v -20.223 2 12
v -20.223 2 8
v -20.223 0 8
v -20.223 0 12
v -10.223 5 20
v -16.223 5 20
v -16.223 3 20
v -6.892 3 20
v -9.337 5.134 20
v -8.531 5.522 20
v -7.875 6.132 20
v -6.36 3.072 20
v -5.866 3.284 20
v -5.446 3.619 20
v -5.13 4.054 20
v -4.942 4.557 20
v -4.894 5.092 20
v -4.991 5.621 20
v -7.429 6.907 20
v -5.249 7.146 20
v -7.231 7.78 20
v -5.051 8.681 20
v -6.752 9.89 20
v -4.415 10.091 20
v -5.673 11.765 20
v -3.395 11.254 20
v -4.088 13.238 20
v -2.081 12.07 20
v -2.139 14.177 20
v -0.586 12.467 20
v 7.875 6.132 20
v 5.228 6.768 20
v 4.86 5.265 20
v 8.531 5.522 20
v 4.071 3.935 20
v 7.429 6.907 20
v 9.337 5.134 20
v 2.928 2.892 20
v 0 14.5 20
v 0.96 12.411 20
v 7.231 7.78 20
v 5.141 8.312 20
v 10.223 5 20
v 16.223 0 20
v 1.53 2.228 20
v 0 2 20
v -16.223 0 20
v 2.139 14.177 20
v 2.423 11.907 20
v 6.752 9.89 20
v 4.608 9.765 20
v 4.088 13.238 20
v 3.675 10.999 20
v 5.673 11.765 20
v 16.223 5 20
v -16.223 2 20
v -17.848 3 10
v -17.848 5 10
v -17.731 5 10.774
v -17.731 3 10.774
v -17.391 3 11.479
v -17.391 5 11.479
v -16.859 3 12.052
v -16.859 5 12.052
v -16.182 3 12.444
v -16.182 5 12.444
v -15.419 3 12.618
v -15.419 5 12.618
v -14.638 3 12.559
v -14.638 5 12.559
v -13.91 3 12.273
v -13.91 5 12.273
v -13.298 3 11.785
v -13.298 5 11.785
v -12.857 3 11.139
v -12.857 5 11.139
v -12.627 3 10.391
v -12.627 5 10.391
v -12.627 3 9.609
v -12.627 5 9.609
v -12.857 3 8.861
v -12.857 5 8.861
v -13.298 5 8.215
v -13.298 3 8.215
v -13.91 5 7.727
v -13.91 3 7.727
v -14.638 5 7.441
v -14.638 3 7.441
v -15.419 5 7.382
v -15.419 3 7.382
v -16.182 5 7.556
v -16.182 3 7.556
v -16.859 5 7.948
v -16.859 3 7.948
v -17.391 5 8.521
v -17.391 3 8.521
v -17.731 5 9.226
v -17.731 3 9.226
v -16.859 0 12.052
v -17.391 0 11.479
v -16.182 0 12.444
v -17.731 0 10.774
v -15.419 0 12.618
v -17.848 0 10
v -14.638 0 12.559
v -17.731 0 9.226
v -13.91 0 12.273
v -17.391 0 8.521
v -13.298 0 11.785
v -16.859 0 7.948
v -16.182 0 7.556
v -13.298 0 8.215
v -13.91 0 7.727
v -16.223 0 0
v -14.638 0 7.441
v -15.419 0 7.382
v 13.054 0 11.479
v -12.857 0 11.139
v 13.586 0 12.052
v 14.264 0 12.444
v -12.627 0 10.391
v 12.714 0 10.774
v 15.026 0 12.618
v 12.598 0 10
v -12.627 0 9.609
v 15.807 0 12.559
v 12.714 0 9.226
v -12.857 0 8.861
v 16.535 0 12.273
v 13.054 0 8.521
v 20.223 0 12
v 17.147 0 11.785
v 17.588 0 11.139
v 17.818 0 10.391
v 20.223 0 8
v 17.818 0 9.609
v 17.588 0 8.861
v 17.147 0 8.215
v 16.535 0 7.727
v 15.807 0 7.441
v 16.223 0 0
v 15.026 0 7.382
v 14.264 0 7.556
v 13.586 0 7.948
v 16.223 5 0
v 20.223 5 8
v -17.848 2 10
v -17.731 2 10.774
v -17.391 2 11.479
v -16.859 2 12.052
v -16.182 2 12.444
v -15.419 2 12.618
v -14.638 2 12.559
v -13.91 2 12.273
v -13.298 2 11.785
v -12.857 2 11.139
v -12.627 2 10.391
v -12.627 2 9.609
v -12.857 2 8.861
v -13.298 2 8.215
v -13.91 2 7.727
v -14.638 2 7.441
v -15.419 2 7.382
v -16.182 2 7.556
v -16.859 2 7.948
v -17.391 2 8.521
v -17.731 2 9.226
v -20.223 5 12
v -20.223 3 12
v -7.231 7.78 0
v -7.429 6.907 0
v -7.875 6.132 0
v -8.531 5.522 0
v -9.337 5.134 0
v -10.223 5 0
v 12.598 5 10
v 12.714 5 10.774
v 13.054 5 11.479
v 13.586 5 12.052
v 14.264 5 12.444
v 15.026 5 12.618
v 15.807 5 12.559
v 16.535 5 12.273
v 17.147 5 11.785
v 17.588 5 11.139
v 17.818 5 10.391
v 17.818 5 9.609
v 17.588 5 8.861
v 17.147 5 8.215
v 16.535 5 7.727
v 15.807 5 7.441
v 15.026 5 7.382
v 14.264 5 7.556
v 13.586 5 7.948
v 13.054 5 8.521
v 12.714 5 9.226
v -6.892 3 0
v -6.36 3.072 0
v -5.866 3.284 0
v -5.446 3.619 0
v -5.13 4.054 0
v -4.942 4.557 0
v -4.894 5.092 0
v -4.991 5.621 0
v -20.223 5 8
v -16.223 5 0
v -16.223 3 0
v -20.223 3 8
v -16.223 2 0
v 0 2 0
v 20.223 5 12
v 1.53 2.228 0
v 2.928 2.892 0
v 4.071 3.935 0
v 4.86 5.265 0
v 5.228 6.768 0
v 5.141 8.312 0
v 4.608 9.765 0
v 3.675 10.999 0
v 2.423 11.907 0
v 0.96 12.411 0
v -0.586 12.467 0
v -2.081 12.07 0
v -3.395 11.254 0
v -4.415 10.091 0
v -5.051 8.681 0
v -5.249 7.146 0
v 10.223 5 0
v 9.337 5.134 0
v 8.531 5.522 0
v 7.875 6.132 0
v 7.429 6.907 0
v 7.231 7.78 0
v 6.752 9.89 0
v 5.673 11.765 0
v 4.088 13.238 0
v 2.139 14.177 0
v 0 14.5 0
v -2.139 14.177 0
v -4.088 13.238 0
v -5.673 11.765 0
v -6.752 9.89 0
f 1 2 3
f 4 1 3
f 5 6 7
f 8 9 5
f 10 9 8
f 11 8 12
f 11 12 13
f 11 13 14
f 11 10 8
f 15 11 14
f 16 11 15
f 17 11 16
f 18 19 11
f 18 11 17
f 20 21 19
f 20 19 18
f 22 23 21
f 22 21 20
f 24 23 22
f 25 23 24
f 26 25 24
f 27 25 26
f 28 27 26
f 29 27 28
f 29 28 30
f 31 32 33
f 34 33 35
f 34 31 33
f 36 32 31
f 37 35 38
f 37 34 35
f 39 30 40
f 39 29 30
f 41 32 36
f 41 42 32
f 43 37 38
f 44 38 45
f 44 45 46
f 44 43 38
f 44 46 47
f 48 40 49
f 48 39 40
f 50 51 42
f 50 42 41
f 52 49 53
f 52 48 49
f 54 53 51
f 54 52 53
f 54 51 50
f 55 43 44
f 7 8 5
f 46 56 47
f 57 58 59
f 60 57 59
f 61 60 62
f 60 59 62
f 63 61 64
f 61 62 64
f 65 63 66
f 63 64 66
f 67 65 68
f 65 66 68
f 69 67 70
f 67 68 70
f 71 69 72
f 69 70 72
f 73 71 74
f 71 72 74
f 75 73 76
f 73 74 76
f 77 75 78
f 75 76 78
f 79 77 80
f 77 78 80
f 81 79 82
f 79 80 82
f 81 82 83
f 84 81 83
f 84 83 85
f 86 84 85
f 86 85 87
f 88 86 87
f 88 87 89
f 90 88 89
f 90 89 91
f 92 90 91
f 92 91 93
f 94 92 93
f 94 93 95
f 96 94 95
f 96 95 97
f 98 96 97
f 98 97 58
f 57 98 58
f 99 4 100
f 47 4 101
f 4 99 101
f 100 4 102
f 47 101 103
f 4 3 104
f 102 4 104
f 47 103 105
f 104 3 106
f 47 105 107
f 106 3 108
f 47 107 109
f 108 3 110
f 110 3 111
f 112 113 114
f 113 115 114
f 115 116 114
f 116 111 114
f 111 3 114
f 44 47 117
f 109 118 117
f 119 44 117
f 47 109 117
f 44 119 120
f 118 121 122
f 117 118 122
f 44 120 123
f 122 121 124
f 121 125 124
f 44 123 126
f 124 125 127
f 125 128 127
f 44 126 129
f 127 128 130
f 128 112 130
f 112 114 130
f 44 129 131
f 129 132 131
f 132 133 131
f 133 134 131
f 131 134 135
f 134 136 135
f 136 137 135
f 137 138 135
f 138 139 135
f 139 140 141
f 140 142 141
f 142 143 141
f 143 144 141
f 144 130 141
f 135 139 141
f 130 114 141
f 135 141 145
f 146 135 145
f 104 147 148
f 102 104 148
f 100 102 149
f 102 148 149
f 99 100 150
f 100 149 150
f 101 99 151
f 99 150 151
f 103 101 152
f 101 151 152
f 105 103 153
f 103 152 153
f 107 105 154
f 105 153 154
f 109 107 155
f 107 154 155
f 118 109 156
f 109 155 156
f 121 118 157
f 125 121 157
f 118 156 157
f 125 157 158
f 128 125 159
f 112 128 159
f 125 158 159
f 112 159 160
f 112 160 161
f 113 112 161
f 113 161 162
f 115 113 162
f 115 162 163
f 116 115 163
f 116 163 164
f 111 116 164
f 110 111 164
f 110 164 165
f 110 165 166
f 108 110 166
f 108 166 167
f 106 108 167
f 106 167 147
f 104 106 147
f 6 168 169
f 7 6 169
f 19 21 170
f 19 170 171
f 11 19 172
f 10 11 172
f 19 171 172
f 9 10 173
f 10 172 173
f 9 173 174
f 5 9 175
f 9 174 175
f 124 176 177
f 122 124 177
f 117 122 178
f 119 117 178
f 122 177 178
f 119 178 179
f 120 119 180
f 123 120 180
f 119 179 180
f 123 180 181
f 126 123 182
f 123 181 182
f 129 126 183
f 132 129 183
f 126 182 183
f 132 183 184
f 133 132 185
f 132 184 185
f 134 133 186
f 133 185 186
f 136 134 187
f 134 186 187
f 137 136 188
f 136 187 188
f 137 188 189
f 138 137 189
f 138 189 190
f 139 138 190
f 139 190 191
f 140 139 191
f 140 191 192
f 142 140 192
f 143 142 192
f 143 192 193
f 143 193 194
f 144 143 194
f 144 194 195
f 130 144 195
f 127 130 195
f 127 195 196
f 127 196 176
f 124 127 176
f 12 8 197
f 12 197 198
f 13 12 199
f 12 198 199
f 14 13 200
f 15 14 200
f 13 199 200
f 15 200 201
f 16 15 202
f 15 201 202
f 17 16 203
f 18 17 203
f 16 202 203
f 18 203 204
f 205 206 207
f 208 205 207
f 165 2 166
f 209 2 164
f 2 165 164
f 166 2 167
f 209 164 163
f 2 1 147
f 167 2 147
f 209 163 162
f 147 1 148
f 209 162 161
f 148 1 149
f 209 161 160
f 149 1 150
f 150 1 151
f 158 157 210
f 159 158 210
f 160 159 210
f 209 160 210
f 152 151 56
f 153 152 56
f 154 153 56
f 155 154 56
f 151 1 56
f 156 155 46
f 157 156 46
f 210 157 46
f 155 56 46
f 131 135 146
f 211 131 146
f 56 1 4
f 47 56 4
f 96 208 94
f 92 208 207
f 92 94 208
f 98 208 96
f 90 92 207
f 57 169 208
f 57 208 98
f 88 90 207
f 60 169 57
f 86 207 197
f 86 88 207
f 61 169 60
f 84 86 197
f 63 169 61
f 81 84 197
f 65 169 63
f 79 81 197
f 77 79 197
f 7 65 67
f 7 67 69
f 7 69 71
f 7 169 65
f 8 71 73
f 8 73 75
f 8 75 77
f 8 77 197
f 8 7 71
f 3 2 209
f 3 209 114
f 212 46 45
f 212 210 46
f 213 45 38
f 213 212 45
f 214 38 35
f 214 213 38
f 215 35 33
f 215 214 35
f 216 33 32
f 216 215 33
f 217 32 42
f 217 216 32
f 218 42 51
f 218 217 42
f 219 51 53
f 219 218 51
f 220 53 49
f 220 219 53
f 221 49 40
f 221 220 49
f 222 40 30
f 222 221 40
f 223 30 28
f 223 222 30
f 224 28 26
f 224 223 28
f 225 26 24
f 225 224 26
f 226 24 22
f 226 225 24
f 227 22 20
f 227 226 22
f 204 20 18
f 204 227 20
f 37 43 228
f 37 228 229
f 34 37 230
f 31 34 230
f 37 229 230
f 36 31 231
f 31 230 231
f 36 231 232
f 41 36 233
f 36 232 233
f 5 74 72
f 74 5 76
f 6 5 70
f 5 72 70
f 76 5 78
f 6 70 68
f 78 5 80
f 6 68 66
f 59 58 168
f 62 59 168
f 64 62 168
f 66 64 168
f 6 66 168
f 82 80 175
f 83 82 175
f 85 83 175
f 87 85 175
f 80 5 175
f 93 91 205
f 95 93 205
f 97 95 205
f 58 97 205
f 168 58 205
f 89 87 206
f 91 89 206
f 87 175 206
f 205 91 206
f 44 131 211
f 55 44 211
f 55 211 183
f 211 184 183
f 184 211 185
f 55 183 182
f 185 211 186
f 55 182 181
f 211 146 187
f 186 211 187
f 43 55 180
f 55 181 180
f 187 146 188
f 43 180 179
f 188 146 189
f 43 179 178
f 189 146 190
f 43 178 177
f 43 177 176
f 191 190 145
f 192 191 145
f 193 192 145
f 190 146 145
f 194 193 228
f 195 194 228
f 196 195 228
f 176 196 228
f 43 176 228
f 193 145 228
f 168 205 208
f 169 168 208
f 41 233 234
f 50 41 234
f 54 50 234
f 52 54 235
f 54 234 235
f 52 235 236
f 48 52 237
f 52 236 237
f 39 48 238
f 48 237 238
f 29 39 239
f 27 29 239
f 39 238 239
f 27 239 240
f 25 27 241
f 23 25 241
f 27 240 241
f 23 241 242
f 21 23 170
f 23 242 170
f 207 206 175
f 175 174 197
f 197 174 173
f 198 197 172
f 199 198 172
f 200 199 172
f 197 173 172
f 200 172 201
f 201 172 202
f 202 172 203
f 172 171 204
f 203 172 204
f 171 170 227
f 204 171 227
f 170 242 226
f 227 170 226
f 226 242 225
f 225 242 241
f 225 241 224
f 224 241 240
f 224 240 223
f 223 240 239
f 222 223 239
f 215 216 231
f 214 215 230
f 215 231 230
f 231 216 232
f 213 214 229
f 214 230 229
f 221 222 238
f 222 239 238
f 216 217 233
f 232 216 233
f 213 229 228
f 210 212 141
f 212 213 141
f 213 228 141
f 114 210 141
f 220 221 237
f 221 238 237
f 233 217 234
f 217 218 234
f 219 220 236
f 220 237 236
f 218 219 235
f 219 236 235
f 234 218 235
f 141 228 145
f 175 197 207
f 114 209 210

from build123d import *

# Parameters (mm, degrees)
F0_R       = 5.25
F1_DEPTH   = 20
F2_W       = 20.2225241501
F2_H       = 1
F3_DEPTH   = 20.001
F4_R       = 2.625
F5_DEPTH   = 5.001
F6_SIZE2   = 8
F6_SIZE    = 4
F7_SIZE2   = 4
F7_SIZE    = 8
F7_2_SIZE2 = 4
F7_2_SIZE  = 8
F8_R       = 2


with BuildPart() as f1:
    # F0 (on Top) → F1 (new body)
    with BuildSketch(Plane.XY):
        with BuildLine():
            Line((-10.2225241501, 5), (-20.2225241501, 5))
            Line((-20.2225241501, 5), (-20.2225241501, 0))
            Line((-20.2225241501, 0), (20.2225241501, 0))
            Line((20.2225241501, 0), (20.2225241501, 5))
            Line((20.2225241501, 5), (10.2225241501, 5))
            ThreePointArc((10.2225241501, 5), (8.180287213, 5.8024403779), (7.2305658623, 7.7804878049))
            ThreePointArc((7.2305658623, 7.7804878049), (0, 14.5), (-7.2305658623, 7.7804878049))
            ThreePointArc((-7.2305658623, 7.7804878049), (-8.180287213, 5.8024403779), (-10.2225241501, 5))
        make_face()
        with Locations((0, 7.25)):
            Circle(F0_R, mode=Mode.SUBTRACT)
    extrude(amount=F1_DEPTH)

    # F2 (on face) → F3 (cut, through all)
    with BuildSketch(Plane.XY.offset(20)):
        with Locations((-10.1112620751, 2.5)):
            Rectangle(F2_W, F2_H)
    extrude(amount=-F3_DEPTH, mode=Mode.SUBTRACT)

    # F4 (on face) → F5 (cut, through all)
    with BuildSketch(Plane(origin=(0, 5, 0), x_dir=(-1, 0, 0), z_dir=(0, 1, 0))):
        with Locations((-15.2225241501, 10)):
            Circle(F4_R)
        with Locations((15.2225241501, 10)):
            Circle(F4_R)
    extrude(amount=-F5_DEPTH, mode=Mode.SUBTRACT)

    # F6
    f6_edges = [f1.edges().sort_by_distance(p)[0] for p in [
        (-20.222524, 1, 20),
        (-20.222524, 4, 20),
        (20.222524, 2.5, 20),
        (-20.222524, 1, 0),
    ]]
    chamfer(f6_edges, length=F6_SIZE, length2=F6_SIZE2)

    # F7
    f7_edges = [f1.edges().sort_by_distance(p)[0] for p in [
        (20.222524, 2.5, 0),
    ]]
    f7_side = f1.faces().sort_by_distance((20.222524, 2.5, 6))[0]
    chamfer(f7_edges, length=F7_SIZE, length2=F7_SIZE2, reference=f7_side)

    # F7#2
    f7_2_edges = [f1.edges().sort_by_distance(p)[0] for p in [
        (-20.222524, 4, 0),
    ]]
    f7_2_side = f1.faces().sort_by_distance((-20.222524, 4, 6))[0]
    chamfer(f7_2_edges, length=F7_2_SIZE, length2=F7_2_SIZE2, reference=f7_2_side)

    # F8
    f8_edges = [f1.edges().sort_by_distance(p)[0] for p in [
        (-3.082207, 3, 10),
    ]]
    fillet(f8_edges, radius=F8_R)


solid = f1.part
